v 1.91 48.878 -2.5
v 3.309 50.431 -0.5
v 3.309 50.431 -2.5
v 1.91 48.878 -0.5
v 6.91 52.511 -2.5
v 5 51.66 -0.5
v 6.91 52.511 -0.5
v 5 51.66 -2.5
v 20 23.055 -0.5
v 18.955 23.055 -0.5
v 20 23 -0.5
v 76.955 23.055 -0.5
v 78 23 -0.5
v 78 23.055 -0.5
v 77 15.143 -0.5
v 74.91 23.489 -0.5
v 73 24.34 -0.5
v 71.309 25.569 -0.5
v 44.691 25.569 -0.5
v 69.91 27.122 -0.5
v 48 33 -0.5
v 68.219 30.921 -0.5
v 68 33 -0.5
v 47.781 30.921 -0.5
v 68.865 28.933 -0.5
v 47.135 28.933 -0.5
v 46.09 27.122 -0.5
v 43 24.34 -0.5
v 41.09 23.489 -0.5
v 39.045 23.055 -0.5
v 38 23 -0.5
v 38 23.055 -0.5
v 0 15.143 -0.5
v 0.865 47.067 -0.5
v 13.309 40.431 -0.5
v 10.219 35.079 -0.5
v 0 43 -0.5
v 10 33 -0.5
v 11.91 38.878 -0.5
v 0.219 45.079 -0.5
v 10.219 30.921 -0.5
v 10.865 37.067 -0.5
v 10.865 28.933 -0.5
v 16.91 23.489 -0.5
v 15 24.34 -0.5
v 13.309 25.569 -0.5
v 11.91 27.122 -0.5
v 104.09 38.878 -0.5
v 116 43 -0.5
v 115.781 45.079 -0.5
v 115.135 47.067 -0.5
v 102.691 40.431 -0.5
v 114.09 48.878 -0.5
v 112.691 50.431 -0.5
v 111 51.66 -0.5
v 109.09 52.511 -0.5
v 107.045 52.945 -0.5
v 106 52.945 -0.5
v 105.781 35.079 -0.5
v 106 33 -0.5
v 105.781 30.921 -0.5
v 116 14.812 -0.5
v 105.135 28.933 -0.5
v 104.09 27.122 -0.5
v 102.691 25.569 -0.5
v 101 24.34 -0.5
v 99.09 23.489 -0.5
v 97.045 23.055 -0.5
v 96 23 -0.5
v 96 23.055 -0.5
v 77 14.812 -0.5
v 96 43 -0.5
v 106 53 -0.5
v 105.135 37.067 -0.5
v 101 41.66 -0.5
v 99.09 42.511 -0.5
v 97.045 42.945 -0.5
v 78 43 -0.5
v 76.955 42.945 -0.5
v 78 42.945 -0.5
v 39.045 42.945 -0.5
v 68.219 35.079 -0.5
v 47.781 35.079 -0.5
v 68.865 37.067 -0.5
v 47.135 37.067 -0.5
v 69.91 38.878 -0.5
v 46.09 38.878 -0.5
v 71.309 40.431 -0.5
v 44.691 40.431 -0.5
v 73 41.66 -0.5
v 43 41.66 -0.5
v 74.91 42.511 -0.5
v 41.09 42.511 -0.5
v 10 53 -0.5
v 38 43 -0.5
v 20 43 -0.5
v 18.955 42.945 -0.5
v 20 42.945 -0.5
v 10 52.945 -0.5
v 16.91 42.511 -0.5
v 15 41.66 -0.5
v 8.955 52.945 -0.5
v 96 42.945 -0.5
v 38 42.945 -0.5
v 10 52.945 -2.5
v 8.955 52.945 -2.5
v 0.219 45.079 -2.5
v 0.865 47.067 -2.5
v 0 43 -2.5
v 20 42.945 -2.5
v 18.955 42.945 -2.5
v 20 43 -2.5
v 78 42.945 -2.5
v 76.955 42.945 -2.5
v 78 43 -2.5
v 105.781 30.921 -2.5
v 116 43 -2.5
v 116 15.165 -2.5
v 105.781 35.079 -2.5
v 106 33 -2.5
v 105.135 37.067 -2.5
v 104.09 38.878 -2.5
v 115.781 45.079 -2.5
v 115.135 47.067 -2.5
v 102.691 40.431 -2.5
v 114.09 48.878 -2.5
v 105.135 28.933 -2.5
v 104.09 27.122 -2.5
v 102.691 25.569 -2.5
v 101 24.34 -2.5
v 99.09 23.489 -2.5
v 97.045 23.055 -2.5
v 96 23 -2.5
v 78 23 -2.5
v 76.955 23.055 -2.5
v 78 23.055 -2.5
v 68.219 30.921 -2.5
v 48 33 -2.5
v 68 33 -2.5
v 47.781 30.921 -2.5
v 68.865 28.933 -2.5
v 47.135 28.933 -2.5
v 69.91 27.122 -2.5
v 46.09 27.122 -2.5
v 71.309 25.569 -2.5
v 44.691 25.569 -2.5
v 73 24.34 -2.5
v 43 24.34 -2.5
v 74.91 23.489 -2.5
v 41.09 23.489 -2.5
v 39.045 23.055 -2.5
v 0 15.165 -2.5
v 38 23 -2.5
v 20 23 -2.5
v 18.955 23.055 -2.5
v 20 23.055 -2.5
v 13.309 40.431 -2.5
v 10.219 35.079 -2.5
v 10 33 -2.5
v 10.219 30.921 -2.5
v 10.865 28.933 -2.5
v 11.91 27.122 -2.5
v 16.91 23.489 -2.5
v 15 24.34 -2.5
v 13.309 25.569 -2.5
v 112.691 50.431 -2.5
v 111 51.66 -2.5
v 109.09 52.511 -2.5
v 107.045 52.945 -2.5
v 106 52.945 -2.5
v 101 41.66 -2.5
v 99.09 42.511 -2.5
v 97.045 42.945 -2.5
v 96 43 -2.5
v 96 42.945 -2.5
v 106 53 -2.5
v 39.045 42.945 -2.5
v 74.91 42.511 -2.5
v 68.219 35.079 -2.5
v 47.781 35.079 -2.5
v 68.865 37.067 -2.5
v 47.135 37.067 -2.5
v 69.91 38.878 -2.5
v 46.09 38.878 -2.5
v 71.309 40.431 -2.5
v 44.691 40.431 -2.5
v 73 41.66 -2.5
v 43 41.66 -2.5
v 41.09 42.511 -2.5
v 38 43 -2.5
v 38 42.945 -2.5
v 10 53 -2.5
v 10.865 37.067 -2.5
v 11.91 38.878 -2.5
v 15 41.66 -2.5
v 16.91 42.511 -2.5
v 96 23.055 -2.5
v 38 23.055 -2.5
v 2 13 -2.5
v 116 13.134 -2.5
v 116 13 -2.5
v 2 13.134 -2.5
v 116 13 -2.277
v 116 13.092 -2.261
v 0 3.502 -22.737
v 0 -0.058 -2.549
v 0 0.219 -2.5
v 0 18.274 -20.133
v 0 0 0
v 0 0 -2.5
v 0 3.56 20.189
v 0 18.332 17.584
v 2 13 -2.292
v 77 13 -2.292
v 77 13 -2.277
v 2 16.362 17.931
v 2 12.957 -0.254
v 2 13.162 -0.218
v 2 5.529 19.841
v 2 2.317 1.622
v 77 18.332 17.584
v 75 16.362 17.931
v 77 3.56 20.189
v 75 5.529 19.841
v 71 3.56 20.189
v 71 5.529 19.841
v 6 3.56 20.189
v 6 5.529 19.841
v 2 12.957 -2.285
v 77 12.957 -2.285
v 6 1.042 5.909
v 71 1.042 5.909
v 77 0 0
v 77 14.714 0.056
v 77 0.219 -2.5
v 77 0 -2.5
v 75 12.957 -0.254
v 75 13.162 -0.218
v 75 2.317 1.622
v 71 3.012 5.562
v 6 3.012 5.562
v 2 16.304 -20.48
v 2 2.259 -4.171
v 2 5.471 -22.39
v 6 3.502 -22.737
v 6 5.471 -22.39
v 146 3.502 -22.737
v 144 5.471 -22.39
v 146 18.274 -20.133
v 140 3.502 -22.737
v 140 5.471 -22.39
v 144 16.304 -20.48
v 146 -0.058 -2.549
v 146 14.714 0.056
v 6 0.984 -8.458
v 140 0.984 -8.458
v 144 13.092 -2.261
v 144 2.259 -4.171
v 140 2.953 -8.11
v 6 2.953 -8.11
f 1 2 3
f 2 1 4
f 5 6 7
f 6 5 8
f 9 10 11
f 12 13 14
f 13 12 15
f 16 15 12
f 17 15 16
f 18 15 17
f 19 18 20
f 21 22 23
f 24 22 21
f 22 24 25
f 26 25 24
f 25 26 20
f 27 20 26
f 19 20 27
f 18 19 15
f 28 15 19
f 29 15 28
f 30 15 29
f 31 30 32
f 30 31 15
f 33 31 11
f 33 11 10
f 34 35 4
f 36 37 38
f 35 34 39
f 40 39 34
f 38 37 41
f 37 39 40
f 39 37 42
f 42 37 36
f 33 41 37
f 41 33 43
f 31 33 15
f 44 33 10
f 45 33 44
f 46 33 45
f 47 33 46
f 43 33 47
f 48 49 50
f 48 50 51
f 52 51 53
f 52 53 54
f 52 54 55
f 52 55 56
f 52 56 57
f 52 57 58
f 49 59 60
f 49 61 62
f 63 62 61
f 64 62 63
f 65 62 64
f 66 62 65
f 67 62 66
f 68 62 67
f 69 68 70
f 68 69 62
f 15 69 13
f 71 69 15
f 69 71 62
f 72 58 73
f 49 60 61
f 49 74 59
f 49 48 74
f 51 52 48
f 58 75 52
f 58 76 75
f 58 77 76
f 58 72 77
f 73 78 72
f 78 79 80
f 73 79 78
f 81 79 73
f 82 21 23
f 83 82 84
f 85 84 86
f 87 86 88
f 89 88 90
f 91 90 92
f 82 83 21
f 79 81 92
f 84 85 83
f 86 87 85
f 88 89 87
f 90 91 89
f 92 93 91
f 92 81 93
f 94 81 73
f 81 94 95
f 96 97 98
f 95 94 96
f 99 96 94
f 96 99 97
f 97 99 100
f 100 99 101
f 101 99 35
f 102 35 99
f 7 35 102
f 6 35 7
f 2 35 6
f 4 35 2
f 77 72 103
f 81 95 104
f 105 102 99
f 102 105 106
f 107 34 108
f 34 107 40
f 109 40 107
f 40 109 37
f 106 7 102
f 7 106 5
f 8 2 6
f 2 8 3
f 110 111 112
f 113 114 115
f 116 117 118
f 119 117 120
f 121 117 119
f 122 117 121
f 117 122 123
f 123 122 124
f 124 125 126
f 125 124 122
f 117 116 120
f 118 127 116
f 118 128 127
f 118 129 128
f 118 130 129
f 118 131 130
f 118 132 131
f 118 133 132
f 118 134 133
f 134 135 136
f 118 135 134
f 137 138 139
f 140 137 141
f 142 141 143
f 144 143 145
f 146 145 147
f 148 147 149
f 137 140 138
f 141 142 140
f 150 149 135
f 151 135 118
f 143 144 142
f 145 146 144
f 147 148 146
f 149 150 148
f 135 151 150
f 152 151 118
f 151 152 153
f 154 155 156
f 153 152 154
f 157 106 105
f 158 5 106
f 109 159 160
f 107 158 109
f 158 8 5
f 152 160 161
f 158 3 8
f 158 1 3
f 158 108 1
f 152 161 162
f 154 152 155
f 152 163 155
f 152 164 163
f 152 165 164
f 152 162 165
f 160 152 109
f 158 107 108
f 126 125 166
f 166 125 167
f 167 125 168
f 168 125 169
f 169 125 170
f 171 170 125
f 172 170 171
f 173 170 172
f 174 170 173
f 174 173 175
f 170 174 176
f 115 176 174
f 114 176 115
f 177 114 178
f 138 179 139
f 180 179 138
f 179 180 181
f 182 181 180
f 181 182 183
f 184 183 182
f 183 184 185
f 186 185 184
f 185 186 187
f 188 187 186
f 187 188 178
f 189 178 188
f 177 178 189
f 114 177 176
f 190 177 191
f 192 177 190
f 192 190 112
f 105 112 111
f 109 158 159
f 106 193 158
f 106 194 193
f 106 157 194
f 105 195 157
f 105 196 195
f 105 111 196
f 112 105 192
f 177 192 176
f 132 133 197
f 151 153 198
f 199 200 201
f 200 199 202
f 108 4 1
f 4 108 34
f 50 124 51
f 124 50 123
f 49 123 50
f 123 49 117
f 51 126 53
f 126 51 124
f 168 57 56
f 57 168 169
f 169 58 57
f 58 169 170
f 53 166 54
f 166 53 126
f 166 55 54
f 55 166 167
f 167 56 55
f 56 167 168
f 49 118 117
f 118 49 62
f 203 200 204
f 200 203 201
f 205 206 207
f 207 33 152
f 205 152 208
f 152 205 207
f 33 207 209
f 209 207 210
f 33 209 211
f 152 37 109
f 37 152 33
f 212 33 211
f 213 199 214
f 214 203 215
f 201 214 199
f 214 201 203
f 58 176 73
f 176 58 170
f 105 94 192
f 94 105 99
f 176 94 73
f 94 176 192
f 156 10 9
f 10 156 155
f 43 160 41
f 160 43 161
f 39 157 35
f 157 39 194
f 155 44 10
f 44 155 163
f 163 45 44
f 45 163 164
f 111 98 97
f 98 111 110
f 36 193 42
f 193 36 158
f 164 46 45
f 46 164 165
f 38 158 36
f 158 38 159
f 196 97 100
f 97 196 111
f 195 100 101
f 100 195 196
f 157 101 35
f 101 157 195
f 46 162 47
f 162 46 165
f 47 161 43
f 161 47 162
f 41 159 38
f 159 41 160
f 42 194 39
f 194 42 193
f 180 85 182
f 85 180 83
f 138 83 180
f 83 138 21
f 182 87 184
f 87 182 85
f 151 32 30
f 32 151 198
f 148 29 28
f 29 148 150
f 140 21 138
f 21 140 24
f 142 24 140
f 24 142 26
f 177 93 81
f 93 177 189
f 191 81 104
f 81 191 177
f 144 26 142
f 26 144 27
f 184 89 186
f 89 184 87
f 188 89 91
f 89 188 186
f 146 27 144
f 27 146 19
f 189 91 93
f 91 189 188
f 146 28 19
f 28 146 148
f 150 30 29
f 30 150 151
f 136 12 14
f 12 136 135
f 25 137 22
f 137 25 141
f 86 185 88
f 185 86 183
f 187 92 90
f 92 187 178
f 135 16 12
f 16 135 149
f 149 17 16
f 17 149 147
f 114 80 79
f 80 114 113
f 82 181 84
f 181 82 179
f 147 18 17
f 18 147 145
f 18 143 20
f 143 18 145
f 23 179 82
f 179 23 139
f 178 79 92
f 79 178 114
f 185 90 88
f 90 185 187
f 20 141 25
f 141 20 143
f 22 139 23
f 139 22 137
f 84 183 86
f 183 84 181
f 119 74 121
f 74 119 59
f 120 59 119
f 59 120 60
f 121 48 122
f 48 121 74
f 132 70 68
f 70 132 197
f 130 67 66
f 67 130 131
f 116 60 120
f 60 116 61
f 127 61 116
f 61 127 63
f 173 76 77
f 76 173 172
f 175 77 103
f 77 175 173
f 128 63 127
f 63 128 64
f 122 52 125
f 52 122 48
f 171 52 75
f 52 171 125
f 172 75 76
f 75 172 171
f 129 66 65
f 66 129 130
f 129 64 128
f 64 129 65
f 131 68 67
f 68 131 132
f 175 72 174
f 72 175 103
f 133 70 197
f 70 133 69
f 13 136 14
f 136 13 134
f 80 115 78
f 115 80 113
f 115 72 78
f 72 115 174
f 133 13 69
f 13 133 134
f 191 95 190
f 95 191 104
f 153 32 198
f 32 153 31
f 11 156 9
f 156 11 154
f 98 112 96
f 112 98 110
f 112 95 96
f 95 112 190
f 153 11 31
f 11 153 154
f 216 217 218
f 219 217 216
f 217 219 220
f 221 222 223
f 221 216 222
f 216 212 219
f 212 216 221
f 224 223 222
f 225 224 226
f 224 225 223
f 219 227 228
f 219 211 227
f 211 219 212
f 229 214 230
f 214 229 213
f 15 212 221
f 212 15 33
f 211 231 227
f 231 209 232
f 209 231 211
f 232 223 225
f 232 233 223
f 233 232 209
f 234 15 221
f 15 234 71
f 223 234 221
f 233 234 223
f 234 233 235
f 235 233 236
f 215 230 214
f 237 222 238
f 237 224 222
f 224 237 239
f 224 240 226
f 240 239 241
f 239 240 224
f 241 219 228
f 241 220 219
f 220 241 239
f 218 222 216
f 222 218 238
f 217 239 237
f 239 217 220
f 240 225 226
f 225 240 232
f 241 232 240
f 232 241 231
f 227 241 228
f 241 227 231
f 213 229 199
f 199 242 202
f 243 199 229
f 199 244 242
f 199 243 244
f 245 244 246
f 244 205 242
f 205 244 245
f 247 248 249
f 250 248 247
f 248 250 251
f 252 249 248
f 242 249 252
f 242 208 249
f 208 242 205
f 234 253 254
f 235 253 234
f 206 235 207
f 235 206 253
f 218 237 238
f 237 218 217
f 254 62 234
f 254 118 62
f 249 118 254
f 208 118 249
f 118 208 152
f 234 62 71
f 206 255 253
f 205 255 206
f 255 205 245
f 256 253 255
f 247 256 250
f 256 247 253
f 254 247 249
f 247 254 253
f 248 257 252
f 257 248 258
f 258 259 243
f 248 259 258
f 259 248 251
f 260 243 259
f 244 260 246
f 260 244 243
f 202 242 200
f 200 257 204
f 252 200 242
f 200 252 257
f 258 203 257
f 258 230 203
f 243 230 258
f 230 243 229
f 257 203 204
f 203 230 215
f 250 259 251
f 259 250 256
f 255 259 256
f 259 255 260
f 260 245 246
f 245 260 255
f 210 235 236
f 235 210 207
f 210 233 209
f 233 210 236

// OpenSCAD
t_fix = 0.5;
s_fix = 2 * t_fix;
thickness = 2;

module box(thickness = 1, depth = 10, width = 10, height = 10) {
  // left
  cube([thickness, depth, height]);
  // right
  translate([width - thickness, 0, 0])
    cube([thickness, depth, height]);
  // front
  translate([width, 0, 0])
    rotate(90, [0,0,1])
      cube([thickness, width, height]);
  // back
  translate([width, depth - thickness, 0])
    rotate(90, [0,0,1])
      cube([thickness, width, height]);

  //bottom
  rotate(90, [0,0,-1])
    rotate(90, [0,-1,0])
      cube([thickness, width, depth]);
}

module handle(thickness = 1, inner_depth = 10, inner_width = 10, inner_height = 10, border = 4) {
  difference() {
    box(thickness , inner_depth, inner_width, inner_height);
    translate([border + thickness, -t_fix, border + thickness])
      cube([inner_width - (2 * border) - (2 * thickness), thickness + s_fix, inner_height]);
  }
}

module partial() {
  thickness = 2;
  inner_depth = 11;
  inner_width = 73;
  inner_height = 16.5;

  handle(thickness = thickness,
      inner_depth = inner_depth + (2 * thickness),
      inner_width = inner_width + (2 * thickness),
      inner_height = inner_height + (2 * thickness));
}

module landscape() {
  thickness = 2;
  inner_depth = 11;
  inner_width = 142;
  inner_height = 16.5;

  handle(thickness = thickness,
      inner_depth = inner_depth + (2 * thickness),
      inner_width = inner_width + (2 * thickness),
      inner_height = inner_height + (2 * thickness));
}

// plate
module plate(width=116, depth=40) {
  hole_size = depth / 2;
  hole_r = hole_size / 2;

  t_l2 = (width / 2) - hole_size;

  l1 = hole_size;
  l2 = l1 > t_l2 ? hole_size : t_l2;

  t_r1 = (width / 2) + hole_size;

  r2 = width - hole_size;
  r1 = t_r1 > r2 ? r2 : t_r1;

  difference() {
    union() {
      translate([hole_r, depth - hole_r, 0])
        cylinder(2, r=hole_r);
      translate([width - hole_r, depth - hole_r, 0])
        cylinder(2, r=hole_r);
     cube([width, depth - hole_r, 2]);
      translate([hole_r, hole_r, 0])
        cube([width - hole_r - hole_r, depth - hole_r, 2]);
    }

    translate([l1, hole_size, -0.5])
      cylinder(3, r = hole_r);
    translate([l2, hole_size, -0.5])
      cylinder(3, r = hole_r);
    translate([r1, hole_size, -0.5])
      cylinder(3, r = hole_r);
    translate([r2, hole_size, -0.5])
      cylinder(3, r = hole_r);

    translate([(width / 2) + hole_size, hole_r, -0.5])
      cube([r2 - r1,hole_size,10]);
    translate([hole_size, hole_r, -0.5])
      cube([l2 - l1, hole_size,10]);
  }
}

translate([0,13,-2.5])
  plate(width=116, depth=40);

// connector
translate([0,0,-2.5])
  cube([77,8,2.5]);

rotate(-10, [1, 0, 0])
  partial();
rotate(10, [1, 0, 0])
  translate([0,-0.5, -2.5])
    mirror([0,0,1])
      landscape();
